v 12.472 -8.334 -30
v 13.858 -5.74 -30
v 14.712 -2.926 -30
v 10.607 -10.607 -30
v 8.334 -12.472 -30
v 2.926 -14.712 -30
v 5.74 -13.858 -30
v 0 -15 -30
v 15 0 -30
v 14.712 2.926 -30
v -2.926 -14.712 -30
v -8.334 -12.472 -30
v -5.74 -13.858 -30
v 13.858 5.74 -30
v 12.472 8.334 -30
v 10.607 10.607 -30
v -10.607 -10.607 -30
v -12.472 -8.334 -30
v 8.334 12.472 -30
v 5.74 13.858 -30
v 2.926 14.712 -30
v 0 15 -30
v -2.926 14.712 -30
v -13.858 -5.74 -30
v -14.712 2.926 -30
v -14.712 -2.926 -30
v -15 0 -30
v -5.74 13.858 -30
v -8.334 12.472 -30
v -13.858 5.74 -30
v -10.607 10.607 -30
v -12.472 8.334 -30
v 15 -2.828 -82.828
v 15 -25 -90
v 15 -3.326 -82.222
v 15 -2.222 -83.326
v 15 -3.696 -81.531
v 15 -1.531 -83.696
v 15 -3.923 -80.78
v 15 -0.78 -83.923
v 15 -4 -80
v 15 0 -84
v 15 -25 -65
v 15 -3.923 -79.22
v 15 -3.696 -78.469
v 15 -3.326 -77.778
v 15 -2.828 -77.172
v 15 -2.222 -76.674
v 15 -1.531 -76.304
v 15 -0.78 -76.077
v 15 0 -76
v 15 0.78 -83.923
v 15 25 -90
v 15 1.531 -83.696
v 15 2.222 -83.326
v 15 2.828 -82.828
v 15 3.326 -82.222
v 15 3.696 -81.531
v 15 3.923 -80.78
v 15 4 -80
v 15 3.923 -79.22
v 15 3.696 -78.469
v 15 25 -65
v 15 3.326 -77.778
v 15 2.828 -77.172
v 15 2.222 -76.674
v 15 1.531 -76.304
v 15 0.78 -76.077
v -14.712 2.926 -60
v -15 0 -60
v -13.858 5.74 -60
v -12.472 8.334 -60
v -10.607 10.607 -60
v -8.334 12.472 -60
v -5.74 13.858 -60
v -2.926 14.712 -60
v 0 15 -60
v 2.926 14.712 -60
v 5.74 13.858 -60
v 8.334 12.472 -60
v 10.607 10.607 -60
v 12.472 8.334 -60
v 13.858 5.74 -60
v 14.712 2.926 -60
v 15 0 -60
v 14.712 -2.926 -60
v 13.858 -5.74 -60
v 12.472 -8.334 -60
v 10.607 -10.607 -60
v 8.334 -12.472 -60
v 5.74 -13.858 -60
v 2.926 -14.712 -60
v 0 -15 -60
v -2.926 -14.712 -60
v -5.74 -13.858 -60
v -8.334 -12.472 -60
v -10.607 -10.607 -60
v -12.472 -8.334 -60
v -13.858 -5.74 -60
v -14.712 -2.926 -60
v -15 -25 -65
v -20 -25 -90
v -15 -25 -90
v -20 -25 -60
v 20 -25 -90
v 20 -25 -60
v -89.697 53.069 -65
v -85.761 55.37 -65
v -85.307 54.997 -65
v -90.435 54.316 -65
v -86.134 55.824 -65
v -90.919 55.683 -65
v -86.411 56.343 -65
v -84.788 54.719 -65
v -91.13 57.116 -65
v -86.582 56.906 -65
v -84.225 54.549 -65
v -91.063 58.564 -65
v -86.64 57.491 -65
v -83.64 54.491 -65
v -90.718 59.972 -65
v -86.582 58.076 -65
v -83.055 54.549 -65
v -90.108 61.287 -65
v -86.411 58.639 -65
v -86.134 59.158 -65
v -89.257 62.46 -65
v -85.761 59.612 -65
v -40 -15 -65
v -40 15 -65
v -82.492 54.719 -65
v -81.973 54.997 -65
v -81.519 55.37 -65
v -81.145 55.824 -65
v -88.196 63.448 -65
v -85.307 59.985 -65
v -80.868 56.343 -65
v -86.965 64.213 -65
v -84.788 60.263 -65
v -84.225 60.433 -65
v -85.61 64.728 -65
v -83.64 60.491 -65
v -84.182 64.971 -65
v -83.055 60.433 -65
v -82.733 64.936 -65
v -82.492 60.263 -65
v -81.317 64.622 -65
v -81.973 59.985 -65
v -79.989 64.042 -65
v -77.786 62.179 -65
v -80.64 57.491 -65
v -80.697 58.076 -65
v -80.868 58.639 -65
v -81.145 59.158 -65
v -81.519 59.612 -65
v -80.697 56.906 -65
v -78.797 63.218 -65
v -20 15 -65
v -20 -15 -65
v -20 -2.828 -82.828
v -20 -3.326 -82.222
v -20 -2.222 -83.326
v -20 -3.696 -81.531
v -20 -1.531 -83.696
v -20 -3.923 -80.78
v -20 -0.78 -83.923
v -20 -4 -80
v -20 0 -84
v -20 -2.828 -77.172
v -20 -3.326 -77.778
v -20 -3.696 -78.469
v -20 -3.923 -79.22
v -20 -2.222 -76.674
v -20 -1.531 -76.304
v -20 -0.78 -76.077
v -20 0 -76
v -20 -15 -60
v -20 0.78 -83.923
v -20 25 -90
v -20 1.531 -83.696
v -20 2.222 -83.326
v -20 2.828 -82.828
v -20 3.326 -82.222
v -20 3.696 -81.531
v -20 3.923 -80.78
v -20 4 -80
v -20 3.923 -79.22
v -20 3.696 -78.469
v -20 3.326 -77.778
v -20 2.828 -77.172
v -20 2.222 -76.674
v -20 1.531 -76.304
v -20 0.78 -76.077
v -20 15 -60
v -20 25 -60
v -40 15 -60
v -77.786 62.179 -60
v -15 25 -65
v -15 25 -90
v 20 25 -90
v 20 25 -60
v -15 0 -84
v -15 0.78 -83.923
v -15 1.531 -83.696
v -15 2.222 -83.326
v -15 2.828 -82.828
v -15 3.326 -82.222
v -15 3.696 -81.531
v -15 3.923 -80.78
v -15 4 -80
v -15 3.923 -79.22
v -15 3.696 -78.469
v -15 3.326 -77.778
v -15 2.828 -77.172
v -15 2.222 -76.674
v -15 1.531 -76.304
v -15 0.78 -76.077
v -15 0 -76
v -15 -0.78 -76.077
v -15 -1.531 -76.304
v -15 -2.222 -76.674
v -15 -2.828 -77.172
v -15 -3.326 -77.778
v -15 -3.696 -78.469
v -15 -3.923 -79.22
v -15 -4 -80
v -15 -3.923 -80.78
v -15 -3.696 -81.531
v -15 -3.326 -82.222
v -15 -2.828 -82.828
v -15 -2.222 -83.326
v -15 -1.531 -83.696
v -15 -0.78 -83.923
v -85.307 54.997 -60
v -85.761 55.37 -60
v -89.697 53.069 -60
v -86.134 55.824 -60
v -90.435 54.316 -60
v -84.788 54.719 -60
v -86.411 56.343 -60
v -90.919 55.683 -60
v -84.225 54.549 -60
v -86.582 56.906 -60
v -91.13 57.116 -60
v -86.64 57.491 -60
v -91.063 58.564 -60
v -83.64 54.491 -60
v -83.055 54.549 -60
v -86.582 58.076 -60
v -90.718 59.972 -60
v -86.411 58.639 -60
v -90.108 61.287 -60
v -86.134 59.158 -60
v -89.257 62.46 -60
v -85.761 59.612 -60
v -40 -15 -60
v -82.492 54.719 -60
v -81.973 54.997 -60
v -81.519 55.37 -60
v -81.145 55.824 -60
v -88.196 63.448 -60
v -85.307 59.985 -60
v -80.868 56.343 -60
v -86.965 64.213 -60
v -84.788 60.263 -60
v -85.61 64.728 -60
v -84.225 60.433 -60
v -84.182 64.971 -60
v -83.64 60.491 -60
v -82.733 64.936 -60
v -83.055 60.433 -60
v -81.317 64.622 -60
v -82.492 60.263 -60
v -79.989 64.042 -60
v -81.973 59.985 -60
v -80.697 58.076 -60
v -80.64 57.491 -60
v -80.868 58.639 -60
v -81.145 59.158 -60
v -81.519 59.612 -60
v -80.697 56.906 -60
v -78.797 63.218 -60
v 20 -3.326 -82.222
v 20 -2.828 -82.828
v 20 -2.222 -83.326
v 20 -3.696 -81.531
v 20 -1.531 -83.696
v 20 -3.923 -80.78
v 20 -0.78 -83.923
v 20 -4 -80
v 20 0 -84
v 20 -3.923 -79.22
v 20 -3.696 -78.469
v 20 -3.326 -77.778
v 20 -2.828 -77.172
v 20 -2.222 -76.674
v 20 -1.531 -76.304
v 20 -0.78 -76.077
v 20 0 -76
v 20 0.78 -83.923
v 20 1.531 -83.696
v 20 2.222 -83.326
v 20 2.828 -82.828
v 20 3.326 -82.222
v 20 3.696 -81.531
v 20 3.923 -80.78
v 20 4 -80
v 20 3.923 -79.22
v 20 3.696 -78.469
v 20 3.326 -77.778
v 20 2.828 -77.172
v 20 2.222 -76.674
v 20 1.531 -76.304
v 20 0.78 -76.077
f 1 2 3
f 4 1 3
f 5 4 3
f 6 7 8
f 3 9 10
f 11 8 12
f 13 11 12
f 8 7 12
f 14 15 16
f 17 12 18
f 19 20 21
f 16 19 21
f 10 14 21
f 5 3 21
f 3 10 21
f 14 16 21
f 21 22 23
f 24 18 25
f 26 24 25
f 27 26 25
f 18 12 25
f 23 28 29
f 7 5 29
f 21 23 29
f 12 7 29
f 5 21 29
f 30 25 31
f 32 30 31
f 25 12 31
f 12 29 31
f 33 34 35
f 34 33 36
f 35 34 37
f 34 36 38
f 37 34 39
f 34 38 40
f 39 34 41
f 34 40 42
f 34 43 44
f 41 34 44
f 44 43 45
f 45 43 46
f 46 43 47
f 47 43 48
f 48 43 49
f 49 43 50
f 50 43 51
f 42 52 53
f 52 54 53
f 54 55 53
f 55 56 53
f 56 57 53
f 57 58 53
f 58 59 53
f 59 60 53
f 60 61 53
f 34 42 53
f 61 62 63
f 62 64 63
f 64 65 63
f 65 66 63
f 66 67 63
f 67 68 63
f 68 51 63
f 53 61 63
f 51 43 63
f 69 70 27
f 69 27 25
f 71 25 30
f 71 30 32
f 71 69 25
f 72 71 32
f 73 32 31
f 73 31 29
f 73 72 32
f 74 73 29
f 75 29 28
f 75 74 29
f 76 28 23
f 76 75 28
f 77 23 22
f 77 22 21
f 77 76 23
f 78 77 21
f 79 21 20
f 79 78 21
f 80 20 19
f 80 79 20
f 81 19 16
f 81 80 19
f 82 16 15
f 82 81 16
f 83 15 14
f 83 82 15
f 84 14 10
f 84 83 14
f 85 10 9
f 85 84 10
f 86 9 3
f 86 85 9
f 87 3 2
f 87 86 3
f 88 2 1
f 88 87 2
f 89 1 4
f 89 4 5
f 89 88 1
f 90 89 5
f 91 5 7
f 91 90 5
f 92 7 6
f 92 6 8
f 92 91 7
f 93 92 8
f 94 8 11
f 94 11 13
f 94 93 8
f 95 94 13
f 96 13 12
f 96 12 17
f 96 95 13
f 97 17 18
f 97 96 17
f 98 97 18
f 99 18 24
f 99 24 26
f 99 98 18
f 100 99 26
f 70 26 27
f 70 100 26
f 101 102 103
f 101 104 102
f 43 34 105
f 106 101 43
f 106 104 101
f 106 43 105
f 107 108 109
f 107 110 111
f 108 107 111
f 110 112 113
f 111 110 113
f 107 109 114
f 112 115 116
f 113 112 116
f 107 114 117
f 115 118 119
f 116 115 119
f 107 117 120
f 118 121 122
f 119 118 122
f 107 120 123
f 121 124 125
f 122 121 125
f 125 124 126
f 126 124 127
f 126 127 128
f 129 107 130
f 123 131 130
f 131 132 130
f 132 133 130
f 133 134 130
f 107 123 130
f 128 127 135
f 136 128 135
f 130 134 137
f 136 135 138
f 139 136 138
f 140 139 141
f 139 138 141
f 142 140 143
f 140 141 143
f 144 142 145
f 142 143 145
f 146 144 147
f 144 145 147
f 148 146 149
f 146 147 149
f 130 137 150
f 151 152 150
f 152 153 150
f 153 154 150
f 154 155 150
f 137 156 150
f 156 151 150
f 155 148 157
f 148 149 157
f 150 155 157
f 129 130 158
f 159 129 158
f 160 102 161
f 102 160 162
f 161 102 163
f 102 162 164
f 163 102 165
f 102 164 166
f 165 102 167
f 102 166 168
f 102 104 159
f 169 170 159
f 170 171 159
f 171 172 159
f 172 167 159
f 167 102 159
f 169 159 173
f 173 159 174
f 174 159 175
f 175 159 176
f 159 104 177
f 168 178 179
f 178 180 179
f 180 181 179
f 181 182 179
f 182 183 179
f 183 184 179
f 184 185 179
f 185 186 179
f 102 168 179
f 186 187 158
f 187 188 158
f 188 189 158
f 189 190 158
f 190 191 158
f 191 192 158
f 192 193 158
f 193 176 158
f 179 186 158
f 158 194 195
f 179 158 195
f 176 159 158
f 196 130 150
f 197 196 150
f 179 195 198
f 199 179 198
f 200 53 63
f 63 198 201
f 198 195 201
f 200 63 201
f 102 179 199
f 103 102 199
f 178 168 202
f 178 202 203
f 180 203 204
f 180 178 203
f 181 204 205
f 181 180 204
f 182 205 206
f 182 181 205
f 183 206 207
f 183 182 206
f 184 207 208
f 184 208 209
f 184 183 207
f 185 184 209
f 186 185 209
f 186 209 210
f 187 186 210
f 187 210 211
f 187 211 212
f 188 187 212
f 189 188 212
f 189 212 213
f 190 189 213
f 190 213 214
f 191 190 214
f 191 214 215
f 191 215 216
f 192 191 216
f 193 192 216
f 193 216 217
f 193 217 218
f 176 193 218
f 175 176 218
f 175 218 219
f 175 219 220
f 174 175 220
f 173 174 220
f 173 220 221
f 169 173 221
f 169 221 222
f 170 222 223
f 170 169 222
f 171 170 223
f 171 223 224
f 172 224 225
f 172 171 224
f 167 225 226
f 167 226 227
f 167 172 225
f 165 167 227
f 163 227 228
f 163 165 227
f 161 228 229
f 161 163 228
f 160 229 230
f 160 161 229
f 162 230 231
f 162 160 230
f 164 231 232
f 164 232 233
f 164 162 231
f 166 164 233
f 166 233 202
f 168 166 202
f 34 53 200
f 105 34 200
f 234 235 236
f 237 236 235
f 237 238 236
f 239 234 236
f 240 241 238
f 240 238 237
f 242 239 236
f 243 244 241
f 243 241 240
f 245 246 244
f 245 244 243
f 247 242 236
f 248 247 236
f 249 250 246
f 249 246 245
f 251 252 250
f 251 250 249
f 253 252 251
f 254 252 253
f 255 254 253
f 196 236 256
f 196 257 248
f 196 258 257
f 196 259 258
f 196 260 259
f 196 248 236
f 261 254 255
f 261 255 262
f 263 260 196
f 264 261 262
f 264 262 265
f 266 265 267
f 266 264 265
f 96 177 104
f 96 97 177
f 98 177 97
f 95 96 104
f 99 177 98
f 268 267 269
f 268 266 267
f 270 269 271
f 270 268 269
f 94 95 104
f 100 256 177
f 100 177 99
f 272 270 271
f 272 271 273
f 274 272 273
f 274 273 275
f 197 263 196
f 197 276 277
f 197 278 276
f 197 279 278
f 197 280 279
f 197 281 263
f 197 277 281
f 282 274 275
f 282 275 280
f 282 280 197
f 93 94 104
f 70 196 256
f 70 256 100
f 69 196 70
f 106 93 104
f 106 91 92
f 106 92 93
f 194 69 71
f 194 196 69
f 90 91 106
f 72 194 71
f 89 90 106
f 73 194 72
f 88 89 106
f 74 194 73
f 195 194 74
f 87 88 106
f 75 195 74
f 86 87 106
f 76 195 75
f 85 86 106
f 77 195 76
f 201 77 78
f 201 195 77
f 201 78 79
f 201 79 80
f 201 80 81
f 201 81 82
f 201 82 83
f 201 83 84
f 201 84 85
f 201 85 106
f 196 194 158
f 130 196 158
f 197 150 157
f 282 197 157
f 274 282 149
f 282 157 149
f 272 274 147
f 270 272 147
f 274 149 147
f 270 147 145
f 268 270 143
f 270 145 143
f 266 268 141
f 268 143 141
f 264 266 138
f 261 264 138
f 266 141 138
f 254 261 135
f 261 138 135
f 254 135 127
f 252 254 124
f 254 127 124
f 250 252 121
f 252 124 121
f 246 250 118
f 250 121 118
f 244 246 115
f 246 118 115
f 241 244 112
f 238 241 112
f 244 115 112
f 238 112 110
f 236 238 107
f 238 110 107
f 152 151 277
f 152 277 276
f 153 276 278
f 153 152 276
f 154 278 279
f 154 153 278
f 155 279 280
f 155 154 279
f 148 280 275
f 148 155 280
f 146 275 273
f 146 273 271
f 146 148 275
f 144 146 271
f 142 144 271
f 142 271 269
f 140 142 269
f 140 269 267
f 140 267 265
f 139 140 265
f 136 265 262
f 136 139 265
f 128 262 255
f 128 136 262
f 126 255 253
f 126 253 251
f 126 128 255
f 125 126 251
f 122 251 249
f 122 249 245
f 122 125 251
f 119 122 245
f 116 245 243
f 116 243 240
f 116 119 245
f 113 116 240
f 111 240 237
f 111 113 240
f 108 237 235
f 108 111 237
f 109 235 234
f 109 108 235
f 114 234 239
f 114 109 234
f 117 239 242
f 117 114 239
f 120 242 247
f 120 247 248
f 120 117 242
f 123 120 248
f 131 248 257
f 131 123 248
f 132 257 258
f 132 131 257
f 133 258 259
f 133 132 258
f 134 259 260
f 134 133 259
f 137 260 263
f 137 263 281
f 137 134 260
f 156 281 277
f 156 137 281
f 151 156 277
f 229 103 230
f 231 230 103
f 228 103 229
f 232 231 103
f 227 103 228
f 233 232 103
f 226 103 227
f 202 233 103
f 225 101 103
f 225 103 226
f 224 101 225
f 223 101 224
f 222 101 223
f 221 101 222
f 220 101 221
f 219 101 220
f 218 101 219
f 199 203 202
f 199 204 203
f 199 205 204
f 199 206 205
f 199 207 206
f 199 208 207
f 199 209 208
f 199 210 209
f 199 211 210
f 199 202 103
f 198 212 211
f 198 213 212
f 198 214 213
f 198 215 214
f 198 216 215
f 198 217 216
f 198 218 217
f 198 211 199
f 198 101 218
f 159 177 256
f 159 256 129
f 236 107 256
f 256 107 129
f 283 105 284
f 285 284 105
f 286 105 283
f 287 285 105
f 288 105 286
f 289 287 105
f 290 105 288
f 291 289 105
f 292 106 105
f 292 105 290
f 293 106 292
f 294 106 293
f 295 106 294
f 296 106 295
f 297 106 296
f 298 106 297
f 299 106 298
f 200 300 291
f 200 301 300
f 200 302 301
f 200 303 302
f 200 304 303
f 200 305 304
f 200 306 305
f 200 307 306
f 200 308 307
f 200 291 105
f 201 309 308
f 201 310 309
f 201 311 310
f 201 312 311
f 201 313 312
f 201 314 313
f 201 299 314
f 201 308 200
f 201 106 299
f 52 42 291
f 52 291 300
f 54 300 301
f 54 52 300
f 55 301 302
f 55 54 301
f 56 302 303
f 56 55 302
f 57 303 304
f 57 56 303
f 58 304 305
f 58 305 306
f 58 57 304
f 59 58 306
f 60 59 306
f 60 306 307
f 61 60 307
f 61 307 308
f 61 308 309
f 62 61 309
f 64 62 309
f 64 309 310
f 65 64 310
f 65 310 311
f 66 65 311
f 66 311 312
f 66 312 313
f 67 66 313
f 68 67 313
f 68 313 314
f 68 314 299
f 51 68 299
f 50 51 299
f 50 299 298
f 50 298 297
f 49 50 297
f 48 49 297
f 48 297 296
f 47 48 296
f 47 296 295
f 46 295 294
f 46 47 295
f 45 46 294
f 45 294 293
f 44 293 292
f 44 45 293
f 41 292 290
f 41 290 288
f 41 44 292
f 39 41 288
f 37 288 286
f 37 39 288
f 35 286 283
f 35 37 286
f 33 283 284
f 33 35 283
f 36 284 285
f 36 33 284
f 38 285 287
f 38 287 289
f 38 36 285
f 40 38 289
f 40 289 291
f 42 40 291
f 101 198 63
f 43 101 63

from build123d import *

# Parameters (mm, degrees)
SKETCH1_W           = 40
SKETCH1_H           = 50
BOSS_EXTRUDE1_DEPTH = 5
SKETCH2_W           = 5
SKETCH2_H           = 50
BOSS_EXTRUDE2_DEPTH = 25
SKETCH3_R           = 4
CUT_EXTRUDE1_DEPTH  = 56.901699437
SKETCH4_W           = 5
SKETCH4_H           = 30
BOSS_EXTRUDE3_DEPTH = 20
SKETCH5_R           = 3
BOSS_EXTRUDE4_DEPTH = 5
SKETCH6_R           = 15
BOSS_EXTRUDE5_DEPTH = 30


with BuildPart() as part:
    # Sketch1 → Boss-Extrude1 (new body)
    with BuildSketch(Plane.XY):
        Rectangle(SKETCH1_W, SKETCH1_H)
    extrude(amount=BOSS_EXTRUDE1_DEPTH)

    # Sketch2 → Boss-Extrude2 (add)
    with BuildSketch(Plane.XY.offset(5)):
        with Locations((-17.5, 0)):
            Rectangle(SKETCH2_W, SKETCH2_H)
        with Locations((17.5, 0)):
            Rectangle(SKETCH2_W, SKETCH2_H)
    extrude(amount=BOSS_EXTRUDE2_DEPTH)

    # Sketch3 → Cut-Extrude1 (cut, through all)
    with BuildSketch(Plane.ZY.offset(20)):
        with Locations((20, 0)):
            Circle(SKETCH3_R)
    extrude(amount=-CUT_EXTRUDE1_DEPTH, mode=Mode.SUBTRACT)

    # Sketch4 → Boss-Extrude3 (add)
    with BuildSketch(Plane.ZY.offset(20)):
        with Locations((2.5, 0)):
            Rectangle(SKETCH4_W, SKETCH4_H)
    extrude(amount=BOSS_EXTRUDE3_DEPTH)

    # Sketch5 → Boss-Extrude4 (add)
    with BuildSketch(Plane.XY.offset(5)):
        with BuildLine():
            Line((-40, 15), (-77.785894763, 62.179423312))
            ThreePointArc((-77.785894763, 62.179423312), (-88.196441443, 63.448140197), (-89.697194155, 53.068503112))
            Line((-89.697194155, 53.068503112), (-40, -15))
            Line((-40, -15), (-40, 15))
        make_face()
        with Locations((-83.639846307, 57.491006594)):
            Circle(SKETCH5_R, mode=Mode.SUBTRACT)
    extrude(amount=-BOSS_EXTRUDE4_DEPTH)

    # Sketch6 → Boss-Extrude5 (add)
    with BuildSketch(Plane(origin=(0, 0, 0), x_dir=(-1, 0, 0), z_dir=(0, 0, -1))):
        Circle(SKETCH6_R)
    extrude(amount=BOSS_EXTRUDE5_DEPTH)


with BuildPart() as body_2:
    # Mirror1: mirrored copy
    add(part.part.mirror(Plane(origin=(0, 0, -30), x_dir=(1, 0, 0), z_dir=(0, 0, -1))))


solid = body_2.part
